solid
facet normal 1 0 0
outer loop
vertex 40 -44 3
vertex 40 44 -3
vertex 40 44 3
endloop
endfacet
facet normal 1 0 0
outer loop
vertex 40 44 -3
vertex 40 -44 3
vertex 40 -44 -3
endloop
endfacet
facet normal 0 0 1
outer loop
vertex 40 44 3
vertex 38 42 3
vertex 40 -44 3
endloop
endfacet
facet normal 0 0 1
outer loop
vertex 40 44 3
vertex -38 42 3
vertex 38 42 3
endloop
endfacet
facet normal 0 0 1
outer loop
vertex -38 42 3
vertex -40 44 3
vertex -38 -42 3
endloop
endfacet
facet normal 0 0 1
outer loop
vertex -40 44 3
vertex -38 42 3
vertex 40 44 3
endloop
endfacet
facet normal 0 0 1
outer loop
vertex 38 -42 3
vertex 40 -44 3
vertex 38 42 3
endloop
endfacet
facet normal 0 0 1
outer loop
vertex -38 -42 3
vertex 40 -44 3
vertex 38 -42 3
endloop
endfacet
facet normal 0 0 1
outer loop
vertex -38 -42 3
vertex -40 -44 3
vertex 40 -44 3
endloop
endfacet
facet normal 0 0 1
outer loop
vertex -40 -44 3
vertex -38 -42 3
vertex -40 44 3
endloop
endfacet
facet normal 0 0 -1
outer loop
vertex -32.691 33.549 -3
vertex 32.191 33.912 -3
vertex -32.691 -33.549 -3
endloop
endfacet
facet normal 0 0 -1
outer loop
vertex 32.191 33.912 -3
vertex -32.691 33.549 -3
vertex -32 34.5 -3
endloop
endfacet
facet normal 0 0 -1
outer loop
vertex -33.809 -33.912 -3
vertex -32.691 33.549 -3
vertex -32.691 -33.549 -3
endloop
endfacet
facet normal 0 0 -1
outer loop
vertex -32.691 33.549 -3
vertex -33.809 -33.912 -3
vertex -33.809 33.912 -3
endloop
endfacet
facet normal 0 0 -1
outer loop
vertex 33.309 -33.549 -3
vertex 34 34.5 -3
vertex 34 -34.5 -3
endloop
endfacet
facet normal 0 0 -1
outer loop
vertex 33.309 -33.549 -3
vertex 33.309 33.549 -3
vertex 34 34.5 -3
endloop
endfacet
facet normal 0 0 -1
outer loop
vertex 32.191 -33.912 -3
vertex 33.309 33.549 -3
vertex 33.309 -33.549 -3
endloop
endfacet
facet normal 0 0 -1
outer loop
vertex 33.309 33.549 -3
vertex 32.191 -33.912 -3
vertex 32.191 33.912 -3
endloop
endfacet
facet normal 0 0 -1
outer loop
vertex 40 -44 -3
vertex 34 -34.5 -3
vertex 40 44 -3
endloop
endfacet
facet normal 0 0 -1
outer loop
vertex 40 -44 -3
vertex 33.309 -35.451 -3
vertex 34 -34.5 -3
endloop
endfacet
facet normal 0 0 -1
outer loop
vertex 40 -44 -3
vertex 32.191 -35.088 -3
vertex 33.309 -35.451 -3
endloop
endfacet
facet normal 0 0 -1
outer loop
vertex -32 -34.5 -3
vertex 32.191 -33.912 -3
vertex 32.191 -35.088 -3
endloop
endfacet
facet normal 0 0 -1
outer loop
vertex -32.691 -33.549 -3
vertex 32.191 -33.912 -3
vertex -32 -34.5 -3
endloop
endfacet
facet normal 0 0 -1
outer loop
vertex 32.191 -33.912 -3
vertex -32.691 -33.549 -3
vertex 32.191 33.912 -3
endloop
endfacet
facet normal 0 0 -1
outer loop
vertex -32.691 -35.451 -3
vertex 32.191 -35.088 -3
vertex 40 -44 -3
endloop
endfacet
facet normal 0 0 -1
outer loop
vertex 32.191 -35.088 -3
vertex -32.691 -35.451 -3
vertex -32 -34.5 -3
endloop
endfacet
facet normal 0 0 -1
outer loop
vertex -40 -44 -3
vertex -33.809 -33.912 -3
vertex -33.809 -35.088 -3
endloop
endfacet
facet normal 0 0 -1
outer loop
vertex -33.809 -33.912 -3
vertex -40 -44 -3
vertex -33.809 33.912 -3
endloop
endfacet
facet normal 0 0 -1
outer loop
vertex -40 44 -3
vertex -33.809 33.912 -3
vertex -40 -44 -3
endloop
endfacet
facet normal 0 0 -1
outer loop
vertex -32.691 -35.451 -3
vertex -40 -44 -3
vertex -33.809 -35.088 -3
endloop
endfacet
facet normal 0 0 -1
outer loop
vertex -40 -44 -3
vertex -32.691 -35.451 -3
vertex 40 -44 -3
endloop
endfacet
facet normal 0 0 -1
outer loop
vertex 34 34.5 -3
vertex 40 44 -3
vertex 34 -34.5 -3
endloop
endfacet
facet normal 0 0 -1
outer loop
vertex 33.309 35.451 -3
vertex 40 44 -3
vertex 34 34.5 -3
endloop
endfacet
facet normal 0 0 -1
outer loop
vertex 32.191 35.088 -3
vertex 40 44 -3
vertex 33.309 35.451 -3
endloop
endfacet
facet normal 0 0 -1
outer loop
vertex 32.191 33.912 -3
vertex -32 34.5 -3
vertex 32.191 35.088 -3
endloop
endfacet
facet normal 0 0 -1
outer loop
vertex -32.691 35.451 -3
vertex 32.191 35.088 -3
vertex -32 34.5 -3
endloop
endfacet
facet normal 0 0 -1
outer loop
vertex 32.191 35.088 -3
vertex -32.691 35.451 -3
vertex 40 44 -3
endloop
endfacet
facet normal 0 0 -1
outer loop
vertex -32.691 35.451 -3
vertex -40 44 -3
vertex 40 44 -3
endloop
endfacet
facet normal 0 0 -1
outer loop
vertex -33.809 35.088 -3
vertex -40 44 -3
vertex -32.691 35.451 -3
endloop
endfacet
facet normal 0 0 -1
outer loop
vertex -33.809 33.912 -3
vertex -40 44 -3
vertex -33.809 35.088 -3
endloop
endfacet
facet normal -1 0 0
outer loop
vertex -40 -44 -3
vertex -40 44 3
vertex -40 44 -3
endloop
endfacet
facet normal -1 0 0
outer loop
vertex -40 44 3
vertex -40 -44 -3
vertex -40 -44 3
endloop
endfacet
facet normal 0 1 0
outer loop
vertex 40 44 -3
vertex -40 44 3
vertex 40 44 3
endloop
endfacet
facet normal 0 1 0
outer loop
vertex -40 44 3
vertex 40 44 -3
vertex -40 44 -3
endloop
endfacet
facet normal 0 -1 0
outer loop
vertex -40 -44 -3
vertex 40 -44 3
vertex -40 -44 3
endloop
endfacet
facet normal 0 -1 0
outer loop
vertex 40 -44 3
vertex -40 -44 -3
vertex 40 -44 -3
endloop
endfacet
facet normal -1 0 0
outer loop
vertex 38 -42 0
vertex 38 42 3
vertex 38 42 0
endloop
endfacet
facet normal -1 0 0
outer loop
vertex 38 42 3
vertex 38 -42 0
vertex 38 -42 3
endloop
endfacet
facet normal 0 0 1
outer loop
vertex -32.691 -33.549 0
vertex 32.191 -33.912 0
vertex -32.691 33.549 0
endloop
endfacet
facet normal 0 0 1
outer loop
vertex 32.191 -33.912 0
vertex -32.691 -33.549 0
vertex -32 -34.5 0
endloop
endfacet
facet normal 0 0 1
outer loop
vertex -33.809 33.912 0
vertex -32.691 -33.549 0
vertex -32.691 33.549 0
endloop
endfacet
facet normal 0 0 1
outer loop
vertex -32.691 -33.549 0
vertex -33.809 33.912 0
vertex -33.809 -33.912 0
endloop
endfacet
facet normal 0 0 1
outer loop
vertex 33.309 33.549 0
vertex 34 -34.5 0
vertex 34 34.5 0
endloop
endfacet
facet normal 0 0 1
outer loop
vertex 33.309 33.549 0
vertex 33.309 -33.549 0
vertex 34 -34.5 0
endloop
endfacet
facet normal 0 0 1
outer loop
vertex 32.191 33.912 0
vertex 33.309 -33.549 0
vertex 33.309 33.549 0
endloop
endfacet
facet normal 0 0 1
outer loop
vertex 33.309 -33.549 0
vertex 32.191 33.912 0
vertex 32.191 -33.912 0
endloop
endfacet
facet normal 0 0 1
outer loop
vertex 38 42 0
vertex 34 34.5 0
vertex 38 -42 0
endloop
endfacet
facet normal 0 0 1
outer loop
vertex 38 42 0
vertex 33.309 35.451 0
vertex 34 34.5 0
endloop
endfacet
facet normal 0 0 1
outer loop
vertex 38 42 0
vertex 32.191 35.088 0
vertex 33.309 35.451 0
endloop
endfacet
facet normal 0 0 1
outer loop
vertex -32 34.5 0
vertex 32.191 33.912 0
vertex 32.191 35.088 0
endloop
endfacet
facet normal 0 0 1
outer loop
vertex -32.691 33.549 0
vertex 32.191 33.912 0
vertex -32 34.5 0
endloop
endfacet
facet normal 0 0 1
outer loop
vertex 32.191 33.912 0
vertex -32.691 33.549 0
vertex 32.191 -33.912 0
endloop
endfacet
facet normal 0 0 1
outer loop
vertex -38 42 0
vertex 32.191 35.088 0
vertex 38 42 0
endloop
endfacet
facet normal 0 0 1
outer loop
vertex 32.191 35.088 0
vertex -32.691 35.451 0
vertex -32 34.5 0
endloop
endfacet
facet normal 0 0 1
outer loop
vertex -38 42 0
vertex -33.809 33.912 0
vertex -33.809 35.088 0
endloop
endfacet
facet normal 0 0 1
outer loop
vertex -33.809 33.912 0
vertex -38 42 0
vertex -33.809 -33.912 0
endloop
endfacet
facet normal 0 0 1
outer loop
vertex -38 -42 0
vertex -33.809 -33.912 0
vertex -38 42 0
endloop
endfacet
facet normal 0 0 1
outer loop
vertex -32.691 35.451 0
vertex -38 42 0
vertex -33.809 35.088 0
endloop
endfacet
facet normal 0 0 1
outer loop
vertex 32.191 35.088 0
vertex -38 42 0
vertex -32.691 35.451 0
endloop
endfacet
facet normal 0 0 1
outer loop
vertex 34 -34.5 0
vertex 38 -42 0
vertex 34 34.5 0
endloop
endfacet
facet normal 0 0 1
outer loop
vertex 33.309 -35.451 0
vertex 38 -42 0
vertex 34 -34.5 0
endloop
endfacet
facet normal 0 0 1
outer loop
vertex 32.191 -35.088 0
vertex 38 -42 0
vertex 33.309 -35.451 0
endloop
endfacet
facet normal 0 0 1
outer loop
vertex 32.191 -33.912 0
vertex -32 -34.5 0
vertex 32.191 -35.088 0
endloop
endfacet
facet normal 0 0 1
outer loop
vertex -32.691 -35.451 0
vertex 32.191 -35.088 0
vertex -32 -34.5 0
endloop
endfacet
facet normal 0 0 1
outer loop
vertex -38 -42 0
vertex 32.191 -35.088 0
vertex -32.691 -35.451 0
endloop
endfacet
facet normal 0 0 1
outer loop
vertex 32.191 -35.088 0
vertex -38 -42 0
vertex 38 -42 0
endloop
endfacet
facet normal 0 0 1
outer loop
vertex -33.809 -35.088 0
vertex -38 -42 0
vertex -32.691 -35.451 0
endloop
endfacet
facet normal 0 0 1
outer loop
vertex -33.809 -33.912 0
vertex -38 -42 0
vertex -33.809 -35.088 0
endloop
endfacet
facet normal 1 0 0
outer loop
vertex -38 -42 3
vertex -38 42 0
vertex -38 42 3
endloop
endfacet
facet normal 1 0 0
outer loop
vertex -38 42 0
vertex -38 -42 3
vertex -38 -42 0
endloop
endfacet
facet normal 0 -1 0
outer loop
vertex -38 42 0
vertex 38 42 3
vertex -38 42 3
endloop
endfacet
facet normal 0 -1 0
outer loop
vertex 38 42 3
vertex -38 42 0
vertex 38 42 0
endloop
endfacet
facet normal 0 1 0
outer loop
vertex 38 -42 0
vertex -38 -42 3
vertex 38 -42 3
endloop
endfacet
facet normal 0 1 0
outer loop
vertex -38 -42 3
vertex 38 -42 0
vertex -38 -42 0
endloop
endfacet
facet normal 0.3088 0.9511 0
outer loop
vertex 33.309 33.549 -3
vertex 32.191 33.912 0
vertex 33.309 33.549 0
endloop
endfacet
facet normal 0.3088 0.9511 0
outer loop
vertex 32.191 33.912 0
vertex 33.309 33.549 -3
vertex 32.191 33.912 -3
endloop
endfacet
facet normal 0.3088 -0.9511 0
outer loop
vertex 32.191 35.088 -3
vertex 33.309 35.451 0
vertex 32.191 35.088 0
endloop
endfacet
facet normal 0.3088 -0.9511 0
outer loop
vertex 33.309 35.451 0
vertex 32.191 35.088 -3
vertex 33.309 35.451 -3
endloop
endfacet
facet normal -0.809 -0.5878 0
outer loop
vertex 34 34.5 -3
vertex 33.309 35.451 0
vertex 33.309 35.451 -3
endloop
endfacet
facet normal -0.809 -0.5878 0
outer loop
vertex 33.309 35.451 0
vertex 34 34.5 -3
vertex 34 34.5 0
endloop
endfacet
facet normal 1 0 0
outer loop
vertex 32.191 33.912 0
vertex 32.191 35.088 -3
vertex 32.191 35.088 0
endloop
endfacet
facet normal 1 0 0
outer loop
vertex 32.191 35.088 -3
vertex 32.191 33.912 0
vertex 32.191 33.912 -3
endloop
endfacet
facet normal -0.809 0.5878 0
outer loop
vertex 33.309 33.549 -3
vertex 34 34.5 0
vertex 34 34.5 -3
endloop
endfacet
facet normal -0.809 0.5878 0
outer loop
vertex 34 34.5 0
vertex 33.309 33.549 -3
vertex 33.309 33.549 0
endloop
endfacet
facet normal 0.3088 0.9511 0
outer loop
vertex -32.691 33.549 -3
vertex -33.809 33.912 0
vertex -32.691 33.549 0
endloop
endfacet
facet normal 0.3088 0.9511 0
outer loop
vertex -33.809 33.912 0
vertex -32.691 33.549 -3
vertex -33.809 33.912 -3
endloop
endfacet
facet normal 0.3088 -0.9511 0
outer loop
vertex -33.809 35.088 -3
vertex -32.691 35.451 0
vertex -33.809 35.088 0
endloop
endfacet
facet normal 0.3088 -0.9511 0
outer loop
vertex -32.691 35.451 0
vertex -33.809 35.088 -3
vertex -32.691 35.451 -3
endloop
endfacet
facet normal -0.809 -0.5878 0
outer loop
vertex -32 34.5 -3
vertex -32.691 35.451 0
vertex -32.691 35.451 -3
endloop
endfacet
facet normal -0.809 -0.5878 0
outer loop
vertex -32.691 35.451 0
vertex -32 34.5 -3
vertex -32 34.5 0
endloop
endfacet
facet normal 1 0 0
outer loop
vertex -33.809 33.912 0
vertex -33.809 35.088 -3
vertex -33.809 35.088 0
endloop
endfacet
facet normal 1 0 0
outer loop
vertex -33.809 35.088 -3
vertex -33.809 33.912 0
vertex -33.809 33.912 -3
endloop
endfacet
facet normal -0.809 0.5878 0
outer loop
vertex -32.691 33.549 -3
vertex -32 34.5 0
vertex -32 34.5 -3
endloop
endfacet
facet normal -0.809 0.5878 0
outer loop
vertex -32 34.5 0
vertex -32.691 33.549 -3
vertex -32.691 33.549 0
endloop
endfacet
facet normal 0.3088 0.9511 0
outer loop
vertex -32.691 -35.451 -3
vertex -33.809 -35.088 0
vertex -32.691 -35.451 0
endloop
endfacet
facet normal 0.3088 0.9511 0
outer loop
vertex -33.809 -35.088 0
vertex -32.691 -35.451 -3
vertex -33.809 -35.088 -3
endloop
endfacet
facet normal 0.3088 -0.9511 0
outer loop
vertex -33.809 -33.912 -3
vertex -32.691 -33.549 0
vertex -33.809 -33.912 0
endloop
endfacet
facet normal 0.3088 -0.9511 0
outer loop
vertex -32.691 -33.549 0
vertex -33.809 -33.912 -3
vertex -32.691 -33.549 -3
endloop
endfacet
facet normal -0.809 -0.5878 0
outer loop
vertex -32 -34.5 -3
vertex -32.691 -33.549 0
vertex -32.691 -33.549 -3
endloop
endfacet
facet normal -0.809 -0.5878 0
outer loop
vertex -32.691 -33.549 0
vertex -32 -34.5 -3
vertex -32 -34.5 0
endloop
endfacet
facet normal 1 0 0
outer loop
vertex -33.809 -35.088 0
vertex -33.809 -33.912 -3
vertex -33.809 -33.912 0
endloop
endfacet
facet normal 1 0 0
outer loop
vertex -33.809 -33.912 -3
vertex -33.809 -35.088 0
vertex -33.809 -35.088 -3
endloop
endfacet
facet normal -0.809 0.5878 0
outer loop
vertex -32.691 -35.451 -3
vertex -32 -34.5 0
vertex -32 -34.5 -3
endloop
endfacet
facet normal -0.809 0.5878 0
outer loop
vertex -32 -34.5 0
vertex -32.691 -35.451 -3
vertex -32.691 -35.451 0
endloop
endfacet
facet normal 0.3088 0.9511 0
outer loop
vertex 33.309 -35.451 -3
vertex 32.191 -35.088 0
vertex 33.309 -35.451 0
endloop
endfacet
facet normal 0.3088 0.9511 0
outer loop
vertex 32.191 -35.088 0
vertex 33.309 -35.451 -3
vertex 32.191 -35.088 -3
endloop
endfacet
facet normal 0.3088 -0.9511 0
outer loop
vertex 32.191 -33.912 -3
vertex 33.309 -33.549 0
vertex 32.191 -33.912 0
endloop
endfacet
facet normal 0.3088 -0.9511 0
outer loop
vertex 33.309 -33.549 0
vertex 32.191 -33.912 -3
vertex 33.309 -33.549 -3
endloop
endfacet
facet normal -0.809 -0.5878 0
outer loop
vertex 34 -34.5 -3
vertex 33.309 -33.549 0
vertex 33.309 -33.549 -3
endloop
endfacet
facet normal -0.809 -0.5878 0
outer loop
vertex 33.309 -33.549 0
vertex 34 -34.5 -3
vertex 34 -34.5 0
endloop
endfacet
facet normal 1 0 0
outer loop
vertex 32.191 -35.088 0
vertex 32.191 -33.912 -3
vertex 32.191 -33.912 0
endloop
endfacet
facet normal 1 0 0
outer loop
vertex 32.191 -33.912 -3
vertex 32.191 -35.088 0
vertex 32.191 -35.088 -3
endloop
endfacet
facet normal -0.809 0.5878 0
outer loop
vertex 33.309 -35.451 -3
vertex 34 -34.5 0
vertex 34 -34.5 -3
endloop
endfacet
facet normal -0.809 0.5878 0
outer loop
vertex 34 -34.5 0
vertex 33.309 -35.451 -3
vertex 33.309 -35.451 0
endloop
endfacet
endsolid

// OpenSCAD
//project enclosure 
//2010 Nathan Oostendorp

//define the amount of space we want in our enclosure
wall_width = 2;         //how wide we want our exterior walls to be
holewall_width = 1.5;   //how wide we want our screw hole walls to be
holetaper = 0.9;        //how much taper from bottom to top to aid screw fit
interior_z = 35;        //our interior height (exterior is computed)
interior_x = 60;        //our PCB's X horizontal dimension
interior_y = 80;        //our PCB's Y horizontal dimension

//define where our screwholes are on our PCB
//set to 0 if you don't care
mounthole_radius = 1;  //radius of our screwhole
mount_inset_x = 5; //how far center is from the edge of the PCB in X
mount_inset_y = 5.5; //how far center is from the edge of the PCB in Y
mount_z = 6;  //how high we want the mount supports

//note that lid fastener screw holes are added to the X dimension
//if you have something with a bigger print bed you may want to invert X/Y
lidfastenhole_radius = 1; //radius of the screwhole
lidfastenhole_inset = 5;  //measured from center of lid fastening hole

//computed parameters for ease of use
exterior_z = interior_z + wall_width;
exterior_x = interior_x + lidfastenhole_radius * 2 + lidfastenhole_inset * 2 + wall_width * 2;
exterior_y = interior_y + wall_width * 2;

mount_offset_x = interior_x / 2 - mount_inset_x;
mount_offset_y = interior_y / 2 - mount_inset_y;
mount_offset_z = interior_z / 2 - mount_z / 2 - wall_width;

lidmount_offset_x = interior_x / 2 + lidfastenhole_radius + wall_width;
lidmount_offset_y = interior_y / 2 - mount_inset_y;
lidmount_offset_z = wall_width / 2;


module housing() {
   difference() { 
       cube(size = [exterior_x, exterior_y, exterior_z], center = true);
       translate ([0, 0, wall_width]) { cube(size = [exterior_x - wall_width * 2, exterior_y - wall_width * 2, exterior_z - wall_width], center = true); }
   }
}

module pcbmount() {
   difference() {
      cylinder(r = holewall_width + mounthole_radius, h = mount_z, center = true);
      cylinder(r1 = mounthole_radius * holetaper, r2 = mounthole_radius, h = mount_z, center = true);
   }
}

module lidmount(mountsupport) {
   union() {
      difference() {
         cylinder(r = holewall_width + lidfastenhole_radius, h = interior_z, center = true);
         cylinder(r1 = lidfastenhole_radius * holetaper, r2 = lidfastenhole_radius, h = interior_z, center = true);
      }
      translate([(holewall_width + lidfastenhole_radius) * mountsupport, 0, 0]) {  
         cube( size = [lidfastenhole_inset - lidfastenhole_radius, wall_width, interior_z], center = true); 
      }
   }
}

module enclosure_lid() {
   difference() {
        cube( size = [exterior_x + wall_width * 2, exterior_y + wall_width * 2, wall_width * 3], center = true);
        translate([0, 0, wall_width]) { cube( size = [exterior_x, exterior_y, wall_width * 2], center = true); }
        translate([lidmount_offset_x, lidmount_offset_y, -1]) { cylinder( r = lidfastenhole_radius, h = wall_width+2, center = true); }
        translate([-lidmount_offset_x, lidmount_offset_y, -1]) { cylinder( r = lidfastenhole_radius, h = wall_width+2, center = true); }
        translate([-lidmount_offset_x, -lidmount_offset_y, -1]) { cylinder( r = lidfastenhole_radius, h = wall_width+2, center = true ); }
        translate([lidmount_offset_x, -lidmount_offset_y, -1]) { cylinder( r = lidfastenhole_radius, h = wall_width +2 , center = true ); }

   }
}


module project_enclosure() {
   
   union() {
      housing();
      translate([mount_offset_x, mount_offset_y, -mount_offset_z]) { pcbmount(); }
      translate([-mount_offset_x, mount_offset_y, -mount_offset_z]) { pcbmount(); }
      translate([-mount_offset_x, -mount_offset_y, -mount_offset_z]) { pcbmount(); }
      translate([mount_offset_x, -mount_offset_y, -mount_offset_z]) { pcbmount(); }
      translate([lidmount_offset_x, lidmount_offset_y, lidmount_offset_z]) { lidmount(1); }
      translate([-lidmount_offset_x, lidmount_offset_y, lidmount_offset_z]) { lidmount(-1); }
      translate([-lidmount_offset_x, -lidmount_offset_y, lidmount_offset_z]) { lidmount(-1); }
      translate([lidmount_offset_x, -lidmount_offset_y, lidmount_offset_z]) { lidmount(1); }
   }


}


//project_enclosure();
enclosure_lid();
